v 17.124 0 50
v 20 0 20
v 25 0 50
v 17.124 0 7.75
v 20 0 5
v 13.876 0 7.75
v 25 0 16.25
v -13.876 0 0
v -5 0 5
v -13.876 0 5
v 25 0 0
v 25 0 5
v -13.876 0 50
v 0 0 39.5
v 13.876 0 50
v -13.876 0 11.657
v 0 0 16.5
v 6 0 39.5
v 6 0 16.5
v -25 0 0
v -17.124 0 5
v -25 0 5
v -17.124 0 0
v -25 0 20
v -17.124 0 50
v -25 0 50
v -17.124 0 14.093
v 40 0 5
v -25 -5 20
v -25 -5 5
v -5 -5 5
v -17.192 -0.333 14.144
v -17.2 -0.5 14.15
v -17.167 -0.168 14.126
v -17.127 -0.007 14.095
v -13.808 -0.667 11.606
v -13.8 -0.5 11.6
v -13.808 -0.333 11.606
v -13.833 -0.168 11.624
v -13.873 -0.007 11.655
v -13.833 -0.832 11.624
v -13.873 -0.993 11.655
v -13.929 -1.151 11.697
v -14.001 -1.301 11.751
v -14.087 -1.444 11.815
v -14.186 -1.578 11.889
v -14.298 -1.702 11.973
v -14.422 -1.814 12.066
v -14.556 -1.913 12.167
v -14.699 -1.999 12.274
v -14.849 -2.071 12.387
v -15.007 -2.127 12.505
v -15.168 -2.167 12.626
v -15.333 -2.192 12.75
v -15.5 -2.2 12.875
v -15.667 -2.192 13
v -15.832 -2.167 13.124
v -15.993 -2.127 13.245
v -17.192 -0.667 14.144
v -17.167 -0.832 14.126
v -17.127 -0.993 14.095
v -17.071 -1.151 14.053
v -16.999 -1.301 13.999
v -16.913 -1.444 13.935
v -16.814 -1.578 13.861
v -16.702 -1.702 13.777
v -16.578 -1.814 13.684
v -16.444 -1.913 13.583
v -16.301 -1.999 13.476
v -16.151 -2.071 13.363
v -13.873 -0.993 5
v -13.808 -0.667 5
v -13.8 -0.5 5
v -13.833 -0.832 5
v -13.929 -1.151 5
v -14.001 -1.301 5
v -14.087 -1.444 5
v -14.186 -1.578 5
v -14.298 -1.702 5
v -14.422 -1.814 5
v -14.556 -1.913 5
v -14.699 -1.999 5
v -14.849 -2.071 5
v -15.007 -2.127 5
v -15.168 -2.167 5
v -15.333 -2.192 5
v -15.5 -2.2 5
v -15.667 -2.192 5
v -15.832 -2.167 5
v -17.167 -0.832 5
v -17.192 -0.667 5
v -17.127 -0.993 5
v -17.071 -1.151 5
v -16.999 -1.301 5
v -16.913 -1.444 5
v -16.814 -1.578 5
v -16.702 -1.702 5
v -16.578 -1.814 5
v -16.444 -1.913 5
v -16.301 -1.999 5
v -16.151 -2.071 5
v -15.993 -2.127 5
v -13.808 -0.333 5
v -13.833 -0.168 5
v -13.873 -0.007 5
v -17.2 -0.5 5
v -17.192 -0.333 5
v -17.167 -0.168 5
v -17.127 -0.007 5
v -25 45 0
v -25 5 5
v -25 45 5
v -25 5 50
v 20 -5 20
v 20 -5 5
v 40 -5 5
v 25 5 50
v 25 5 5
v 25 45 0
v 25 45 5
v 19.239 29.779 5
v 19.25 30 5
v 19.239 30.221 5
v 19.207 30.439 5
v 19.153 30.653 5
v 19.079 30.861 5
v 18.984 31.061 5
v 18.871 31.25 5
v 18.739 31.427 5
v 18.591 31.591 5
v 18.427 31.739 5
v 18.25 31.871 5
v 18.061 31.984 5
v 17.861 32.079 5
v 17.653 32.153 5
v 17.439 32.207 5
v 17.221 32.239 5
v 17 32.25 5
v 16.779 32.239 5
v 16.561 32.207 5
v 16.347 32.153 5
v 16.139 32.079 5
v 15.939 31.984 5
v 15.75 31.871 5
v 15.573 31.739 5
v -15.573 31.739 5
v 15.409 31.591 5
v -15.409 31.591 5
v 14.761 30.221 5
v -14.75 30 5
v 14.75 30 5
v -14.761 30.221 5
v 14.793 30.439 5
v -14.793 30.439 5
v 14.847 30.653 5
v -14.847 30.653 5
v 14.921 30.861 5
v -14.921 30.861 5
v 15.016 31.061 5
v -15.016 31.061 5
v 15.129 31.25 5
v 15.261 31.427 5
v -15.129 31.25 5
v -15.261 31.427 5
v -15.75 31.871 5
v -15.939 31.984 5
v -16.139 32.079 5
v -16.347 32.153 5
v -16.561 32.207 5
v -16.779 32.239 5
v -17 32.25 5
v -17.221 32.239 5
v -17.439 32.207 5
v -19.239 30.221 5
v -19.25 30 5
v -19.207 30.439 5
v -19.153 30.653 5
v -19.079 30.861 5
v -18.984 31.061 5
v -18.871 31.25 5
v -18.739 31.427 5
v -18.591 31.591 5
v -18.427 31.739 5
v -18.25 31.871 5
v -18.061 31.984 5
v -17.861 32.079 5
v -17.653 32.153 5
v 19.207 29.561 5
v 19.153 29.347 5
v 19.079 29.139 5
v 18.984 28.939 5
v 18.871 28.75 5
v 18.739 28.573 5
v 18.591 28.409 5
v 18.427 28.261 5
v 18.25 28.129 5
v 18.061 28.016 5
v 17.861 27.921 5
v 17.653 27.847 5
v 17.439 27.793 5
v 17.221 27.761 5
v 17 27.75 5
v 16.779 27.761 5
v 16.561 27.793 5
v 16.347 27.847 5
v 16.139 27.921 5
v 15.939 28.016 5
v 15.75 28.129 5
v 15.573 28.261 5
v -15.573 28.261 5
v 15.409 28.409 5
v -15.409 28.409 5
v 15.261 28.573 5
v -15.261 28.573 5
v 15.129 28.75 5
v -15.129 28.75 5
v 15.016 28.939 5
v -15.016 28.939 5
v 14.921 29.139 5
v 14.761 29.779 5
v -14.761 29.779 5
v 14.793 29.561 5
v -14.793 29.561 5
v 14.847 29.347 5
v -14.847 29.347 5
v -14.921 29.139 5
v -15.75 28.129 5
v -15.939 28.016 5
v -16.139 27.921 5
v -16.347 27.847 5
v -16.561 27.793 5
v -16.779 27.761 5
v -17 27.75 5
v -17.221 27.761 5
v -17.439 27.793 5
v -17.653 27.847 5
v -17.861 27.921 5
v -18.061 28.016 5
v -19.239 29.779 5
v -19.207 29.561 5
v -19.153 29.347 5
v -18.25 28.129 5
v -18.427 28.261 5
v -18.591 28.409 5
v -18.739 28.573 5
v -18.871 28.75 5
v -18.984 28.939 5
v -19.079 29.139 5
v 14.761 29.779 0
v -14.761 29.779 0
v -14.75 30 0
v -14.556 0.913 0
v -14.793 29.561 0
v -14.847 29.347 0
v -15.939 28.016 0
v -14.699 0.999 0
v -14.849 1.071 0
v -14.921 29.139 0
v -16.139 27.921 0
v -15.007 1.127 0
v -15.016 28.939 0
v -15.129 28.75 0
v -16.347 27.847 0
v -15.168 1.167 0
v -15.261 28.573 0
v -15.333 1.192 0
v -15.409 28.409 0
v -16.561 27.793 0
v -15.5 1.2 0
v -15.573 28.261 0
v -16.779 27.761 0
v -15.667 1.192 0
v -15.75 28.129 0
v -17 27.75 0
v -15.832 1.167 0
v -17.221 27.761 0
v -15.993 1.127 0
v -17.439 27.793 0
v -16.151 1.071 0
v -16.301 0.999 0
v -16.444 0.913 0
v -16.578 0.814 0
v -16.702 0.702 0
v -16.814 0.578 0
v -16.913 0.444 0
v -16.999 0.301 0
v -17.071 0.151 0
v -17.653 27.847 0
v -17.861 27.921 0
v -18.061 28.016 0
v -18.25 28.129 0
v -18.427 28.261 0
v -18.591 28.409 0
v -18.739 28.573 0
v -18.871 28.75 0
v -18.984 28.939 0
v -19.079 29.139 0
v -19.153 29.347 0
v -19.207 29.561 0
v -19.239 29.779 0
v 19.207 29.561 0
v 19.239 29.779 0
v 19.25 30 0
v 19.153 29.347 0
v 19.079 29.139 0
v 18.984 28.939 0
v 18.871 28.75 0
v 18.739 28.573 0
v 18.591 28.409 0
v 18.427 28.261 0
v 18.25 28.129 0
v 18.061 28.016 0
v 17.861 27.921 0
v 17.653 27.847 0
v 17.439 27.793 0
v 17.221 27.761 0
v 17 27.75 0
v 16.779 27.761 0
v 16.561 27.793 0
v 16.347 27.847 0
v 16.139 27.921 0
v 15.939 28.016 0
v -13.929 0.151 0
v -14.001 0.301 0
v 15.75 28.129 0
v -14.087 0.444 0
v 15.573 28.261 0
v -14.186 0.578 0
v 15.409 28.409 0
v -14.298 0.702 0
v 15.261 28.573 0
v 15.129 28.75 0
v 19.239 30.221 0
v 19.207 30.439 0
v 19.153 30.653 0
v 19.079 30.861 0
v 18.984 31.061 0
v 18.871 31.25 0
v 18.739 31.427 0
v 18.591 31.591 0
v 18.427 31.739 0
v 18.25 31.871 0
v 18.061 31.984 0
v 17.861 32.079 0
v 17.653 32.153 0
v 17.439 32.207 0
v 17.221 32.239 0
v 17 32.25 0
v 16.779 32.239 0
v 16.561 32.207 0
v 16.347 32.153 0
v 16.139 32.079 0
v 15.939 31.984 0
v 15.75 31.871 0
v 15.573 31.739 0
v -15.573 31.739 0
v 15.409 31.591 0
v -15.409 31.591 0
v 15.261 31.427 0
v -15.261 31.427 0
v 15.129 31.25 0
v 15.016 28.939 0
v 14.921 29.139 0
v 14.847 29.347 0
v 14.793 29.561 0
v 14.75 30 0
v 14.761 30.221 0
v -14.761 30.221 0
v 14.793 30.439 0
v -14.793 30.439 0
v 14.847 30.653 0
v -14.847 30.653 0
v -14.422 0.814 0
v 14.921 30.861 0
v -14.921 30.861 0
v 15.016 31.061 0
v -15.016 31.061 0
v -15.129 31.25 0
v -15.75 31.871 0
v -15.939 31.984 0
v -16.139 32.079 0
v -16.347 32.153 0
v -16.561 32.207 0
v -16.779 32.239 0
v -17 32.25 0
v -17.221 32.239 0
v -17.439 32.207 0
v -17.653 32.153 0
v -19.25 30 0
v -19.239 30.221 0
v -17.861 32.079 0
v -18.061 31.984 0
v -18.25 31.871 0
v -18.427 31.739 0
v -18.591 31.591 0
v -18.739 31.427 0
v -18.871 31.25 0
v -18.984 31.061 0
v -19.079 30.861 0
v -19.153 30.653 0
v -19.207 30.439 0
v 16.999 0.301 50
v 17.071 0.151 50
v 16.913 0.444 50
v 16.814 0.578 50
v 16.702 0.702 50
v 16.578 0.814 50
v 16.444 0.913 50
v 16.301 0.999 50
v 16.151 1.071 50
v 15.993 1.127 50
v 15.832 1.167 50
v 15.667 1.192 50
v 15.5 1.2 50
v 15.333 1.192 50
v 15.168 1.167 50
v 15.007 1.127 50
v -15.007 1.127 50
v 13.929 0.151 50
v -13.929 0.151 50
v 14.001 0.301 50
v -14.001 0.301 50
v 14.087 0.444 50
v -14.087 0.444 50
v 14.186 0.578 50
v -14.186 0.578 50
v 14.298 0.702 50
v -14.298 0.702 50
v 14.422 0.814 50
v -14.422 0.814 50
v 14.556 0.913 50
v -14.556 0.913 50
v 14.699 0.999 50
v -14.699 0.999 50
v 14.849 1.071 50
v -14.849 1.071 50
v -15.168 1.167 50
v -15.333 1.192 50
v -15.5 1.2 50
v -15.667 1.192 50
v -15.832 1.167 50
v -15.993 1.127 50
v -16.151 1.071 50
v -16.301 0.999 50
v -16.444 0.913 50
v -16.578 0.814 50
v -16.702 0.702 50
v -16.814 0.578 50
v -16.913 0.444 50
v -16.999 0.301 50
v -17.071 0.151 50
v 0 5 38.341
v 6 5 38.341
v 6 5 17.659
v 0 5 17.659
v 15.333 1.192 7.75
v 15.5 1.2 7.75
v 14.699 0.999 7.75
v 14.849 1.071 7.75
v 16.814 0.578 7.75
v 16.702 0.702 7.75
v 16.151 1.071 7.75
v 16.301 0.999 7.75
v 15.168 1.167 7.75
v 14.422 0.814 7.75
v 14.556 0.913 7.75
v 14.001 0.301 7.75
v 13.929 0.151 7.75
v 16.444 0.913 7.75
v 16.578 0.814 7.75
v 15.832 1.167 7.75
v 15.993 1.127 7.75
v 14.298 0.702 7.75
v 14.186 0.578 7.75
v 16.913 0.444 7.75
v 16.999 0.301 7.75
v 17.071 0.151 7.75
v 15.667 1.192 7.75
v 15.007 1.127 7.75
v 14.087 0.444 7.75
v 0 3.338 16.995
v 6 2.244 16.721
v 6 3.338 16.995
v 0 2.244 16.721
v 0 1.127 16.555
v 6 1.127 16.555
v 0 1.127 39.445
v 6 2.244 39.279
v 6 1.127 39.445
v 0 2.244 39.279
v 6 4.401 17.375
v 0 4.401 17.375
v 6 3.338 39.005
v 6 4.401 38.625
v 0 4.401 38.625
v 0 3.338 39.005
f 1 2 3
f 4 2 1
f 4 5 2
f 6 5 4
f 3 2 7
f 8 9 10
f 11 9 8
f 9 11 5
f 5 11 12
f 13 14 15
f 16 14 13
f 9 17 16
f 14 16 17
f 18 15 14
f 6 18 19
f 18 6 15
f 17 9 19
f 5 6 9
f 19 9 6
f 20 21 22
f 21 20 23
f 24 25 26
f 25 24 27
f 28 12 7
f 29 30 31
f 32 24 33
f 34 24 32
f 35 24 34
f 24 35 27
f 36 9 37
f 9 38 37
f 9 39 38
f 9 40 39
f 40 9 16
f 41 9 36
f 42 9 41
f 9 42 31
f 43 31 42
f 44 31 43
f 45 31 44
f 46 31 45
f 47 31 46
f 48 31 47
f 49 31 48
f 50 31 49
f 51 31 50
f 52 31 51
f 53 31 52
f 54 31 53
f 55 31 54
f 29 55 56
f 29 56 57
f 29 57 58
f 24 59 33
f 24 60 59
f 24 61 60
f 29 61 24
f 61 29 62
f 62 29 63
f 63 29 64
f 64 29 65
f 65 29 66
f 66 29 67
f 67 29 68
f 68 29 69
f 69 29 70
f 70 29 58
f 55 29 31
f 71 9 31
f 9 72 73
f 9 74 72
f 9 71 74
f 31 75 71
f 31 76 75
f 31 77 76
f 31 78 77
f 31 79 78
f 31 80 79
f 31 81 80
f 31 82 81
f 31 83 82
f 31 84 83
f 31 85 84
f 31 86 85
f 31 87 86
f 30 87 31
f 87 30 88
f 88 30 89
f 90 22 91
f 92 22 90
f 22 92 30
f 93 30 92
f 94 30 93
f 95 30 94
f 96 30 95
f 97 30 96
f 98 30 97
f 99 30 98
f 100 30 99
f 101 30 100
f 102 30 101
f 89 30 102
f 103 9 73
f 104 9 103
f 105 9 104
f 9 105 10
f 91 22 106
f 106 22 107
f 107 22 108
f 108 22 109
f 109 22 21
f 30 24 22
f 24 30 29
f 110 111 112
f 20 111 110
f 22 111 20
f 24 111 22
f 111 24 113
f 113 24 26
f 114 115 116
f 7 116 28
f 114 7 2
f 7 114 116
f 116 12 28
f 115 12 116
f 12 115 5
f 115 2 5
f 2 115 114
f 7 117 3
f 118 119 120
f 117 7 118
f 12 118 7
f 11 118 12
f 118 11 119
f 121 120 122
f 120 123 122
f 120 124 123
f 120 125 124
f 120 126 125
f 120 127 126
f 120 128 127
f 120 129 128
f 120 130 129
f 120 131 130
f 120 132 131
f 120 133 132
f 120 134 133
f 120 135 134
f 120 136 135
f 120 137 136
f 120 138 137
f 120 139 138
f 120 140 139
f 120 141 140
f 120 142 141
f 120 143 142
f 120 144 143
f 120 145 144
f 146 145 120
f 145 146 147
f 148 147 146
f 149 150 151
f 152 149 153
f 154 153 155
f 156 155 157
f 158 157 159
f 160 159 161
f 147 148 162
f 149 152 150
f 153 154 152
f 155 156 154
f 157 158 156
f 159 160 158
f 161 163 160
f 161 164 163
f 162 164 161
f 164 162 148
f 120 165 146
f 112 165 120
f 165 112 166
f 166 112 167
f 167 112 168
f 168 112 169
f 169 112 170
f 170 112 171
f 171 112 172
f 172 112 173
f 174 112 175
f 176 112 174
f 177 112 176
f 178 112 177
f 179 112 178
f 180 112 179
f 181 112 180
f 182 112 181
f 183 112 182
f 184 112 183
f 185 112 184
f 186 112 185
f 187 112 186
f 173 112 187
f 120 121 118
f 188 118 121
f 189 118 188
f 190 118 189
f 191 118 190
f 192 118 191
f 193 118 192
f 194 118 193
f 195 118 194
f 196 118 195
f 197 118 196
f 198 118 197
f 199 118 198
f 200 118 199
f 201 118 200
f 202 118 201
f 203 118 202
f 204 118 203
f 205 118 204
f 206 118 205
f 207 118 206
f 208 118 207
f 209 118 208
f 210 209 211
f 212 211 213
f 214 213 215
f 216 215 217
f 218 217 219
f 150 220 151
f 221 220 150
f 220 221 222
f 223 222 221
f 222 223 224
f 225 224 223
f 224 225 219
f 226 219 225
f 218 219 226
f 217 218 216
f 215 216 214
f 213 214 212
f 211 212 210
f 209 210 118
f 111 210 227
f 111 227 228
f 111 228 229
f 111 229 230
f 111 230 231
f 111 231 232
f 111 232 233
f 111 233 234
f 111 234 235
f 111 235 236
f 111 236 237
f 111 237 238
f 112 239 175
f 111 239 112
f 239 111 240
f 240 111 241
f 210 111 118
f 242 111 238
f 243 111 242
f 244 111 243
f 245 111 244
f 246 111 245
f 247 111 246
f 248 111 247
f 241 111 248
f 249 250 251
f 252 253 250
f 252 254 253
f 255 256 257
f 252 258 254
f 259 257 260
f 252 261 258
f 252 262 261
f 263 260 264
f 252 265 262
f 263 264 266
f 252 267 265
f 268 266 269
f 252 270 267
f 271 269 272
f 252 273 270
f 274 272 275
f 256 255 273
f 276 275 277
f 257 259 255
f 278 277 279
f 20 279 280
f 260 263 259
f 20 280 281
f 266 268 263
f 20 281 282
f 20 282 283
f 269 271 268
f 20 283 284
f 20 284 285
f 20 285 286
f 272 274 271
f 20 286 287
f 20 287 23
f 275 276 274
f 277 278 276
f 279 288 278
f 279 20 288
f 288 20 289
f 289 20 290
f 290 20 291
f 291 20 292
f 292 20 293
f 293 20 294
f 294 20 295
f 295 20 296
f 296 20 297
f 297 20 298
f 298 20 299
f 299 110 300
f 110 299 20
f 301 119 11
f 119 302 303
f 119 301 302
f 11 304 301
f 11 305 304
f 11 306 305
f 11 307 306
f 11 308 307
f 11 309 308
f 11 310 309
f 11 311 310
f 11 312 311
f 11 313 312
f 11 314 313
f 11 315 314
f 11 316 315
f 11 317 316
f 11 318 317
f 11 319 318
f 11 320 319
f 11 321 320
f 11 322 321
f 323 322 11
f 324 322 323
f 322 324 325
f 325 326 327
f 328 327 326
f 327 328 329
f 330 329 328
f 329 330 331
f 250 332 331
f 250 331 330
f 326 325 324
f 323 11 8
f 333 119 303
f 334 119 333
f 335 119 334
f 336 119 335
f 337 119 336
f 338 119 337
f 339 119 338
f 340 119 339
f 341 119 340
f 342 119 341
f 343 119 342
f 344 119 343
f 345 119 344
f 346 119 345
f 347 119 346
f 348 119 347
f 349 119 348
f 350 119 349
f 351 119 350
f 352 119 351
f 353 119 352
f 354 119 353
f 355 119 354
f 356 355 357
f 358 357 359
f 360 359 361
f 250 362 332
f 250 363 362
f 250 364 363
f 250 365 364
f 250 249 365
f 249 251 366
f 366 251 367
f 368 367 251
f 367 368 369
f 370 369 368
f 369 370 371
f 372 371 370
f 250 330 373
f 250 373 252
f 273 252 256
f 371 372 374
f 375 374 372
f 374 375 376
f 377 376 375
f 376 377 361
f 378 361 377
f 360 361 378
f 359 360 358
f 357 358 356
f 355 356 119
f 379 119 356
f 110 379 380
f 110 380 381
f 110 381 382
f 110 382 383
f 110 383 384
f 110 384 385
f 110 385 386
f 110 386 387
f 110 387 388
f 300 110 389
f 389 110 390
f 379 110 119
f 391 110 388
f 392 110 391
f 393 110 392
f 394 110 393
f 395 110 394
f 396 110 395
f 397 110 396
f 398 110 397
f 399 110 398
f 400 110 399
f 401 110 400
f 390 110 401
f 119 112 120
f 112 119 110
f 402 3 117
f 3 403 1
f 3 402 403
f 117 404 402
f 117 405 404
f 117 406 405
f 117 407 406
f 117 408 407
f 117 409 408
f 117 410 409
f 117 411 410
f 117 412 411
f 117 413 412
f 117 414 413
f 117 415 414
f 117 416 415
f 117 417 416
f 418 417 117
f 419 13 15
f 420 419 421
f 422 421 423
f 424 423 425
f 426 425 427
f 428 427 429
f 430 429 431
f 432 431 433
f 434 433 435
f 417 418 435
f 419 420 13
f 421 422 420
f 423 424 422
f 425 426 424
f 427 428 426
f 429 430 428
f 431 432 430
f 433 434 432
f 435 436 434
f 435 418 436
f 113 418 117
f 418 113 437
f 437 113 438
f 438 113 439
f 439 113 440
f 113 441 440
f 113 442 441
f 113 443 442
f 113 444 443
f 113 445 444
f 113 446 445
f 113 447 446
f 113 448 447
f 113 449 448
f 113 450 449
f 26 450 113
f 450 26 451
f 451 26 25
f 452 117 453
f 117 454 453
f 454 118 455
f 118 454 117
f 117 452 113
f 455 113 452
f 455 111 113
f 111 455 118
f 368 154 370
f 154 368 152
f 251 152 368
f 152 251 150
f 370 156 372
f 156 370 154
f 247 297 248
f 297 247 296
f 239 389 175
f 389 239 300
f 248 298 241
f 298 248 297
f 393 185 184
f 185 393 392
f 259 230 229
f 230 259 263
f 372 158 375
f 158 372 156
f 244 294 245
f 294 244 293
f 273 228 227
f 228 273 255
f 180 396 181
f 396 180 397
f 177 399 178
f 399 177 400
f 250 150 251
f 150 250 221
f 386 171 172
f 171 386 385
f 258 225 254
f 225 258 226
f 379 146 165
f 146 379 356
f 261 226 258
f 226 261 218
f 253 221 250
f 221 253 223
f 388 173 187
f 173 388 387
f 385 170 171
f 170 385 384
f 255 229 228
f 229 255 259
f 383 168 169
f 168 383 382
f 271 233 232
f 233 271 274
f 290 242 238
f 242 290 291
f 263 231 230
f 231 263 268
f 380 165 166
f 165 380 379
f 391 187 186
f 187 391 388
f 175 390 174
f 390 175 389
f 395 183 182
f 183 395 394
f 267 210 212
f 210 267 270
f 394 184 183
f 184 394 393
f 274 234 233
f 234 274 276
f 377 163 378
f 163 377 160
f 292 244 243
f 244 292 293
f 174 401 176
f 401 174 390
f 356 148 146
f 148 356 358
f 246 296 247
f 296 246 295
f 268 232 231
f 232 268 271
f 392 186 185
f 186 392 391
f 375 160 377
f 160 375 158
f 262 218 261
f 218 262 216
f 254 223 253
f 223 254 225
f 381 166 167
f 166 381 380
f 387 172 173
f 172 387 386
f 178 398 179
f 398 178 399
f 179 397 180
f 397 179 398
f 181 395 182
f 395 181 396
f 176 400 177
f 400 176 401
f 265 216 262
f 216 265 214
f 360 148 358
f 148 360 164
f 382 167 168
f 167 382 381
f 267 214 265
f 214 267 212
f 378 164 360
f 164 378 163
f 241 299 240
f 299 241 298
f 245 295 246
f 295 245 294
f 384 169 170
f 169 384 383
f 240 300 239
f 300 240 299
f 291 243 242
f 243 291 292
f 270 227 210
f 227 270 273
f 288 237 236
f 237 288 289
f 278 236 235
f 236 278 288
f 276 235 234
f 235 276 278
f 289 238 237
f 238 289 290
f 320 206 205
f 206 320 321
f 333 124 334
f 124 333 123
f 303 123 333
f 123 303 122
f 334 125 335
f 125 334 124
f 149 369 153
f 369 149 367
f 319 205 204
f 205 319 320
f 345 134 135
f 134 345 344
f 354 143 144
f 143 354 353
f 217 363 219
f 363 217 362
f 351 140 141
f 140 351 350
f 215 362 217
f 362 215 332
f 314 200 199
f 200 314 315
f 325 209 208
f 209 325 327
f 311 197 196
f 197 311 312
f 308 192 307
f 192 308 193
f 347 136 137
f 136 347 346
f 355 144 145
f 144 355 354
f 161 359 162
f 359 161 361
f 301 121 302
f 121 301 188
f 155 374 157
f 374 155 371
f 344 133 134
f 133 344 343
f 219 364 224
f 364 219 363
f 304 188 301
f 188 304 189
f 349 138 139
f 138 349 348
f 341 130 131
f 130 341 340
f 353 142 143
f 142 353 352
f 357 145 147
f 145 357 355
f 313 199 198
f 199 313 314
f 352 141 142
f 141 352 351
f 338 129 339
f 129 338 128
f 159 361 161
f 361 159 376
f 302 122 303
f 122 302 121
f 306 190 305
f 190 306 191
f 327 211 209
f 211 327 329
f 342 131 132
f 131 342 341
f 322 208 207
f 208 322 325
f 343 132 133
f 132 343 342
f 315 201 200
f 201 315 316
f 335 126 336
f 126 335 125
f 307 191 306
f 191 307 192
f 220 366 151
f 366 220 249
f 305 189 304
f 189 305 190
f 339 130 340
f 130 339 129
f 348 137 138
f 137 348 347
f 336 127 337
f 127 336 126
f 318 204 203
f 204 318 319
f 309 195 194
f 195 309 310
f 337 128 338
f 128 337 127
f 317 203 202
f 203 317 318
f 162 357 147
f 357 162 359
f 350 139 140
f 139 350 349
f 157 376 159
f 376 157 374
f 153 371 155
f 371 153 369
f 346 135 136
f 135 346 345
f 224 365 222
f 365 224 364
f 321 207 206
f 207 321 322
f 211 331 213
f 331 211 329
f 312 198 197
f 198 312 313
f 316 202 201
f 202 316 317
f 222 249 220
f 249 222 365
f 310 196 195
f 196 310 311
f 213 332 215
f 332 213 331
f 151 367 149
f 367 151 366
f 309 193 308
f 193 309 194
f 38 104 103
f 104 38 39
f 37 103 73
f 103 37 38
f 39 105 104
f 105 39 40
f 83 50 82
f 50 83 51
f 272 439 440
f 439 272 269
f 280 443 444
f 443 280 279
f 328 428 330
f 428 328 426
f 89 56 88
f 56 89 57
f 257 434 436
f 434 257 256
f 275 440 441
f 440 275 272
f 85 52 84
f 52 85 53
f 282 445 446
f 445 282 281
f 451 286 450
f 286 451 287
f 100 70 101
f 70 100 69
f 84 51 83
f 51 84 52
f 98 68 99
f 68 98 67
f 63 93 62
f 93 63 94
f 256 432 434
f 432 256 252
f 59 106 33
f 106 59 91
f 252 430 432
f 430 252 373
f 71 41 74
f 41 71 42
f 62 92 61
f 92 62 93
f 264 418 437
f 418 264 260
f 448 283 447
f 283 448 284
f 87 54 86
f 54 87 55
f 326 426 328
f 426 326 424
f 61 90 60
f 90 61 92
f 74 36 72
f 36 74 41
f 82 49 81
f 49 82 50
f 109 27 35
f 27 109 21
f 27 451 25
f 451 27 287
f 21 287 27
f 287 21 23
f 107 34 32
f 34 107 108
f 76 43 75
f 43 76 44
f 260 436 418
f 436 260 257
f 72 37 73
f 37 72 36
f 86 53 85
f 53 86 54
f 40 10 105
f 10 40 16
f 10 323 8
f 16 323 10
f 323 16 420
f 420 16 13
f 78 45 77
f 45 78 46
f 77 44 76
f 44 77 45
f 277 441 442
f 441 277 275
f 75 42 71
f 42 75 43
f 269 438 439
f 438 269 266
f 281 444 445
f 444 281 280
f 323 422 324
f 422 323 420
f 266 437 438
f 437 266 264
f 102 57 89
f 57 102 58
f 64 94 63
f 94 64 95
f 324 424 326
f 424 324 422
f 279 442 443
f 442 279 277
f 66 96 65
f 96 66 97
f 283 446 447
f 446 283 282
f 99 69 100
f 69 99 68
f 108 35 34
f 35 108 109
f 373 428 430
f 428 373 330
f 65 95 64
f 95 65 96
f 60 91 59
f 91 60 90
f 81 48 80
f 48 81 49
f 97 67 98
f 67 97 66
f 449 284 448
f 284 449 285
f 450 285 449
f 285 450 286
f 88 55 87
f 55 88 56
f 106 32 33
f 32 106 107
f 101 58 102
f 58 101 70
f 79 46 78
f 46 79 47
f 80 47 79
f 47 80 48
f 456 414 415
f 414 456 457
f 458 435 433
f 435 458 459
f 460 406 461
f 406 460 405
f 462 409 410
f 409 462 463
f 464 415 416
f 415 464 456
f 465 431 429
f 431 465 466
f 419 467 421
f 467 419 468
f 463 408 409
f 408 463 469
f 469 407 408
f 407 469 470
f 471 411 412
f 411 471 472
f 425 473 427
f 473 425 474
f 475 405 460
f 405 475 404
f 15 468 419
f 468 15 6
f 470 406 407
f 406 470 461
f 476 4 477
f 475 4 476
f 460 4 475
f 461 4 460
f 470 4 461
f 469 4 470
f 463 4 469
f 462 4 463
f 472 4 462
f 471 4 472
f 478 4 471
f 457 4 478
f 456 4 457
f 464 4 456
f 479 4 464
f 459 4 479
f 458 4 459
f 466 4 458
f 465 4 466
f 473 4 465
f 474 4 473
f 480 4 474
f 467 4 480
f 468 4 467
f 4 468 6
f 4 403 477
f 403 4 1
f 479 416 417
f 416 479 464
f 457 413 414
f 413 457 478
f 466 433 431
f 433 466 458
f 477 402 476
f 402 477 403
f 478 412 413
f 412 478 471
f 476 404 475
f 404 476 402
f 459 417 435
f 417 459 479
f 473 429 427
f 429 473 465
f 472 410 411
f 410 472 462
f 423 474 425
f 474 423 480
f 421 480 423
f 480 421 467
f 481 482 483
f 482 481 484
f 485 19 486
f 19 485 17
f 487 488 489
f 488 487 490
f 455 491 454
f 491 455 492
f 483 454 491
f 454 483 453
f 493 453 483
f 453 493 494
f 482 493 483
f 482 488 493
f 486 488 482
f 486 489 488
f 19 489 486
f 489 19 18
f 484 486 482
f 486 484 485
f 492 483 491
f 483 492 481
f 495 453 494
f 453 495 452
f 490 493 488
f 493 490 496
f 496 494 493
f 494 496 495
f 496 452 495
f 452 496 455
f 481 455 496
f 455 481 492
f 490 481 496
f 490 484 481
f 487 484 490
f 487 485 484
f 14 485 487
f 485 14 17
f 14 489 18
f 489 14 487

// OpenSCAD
// L-shaped mounting bracket for NEMA 17 stepper motor (e.g. syringe pump)
// Print orientation: base plate on bed (z = 0), motor plate builds upward.

$fn = 64;

// ---- Base plate ----
base_x0 = -25;      // base plate x start
base_x1 = 25;       // base plate x end
base_y0 = 0;        // base plate y start
base_y1 = 45;       // base plate y end
base_z0 = 0;        // base plate z start
base_z1 = 5;        // base plate z end
hole_d4 = 4.5;      // M4 through-hole diameter
hole_x4 = [-17, 17];// M4 hole x positions
hole_y4 = 30;       // M4 hole y position

// ---- Motor plate ----
motor_x0 = -25;     // motor plate x start
motor_x1 = 25;      // motor plate x end
motor_y0 = 0;       // motor plate y start
motor_y1 = 5;       // motor plate y end
motor_z0 = 0;       // motor plate z start
motor_z1 = 50;      // motor plate z end
boss_d  = 23;       // motor centring boss hole diameter
boss_x  = 0;        // boss hole x centre
boss_z  = 28;       // boss hole z centre
screw_d = 3.4;      // M3 screw hole diameter
screw_n = 4;        // number of screw holes
screw_a = 31;       // square pattern side length

// ---- Gussets ----
gusset_t = 5;       // gusset thickness (X)
gusset_y = 20;      // leg length along +Y
gusset_z = 20;      // leg length along +Z

// ---- Misc ----
eps = 0.5;          // cutter overshoot

difference() {
    union() {
        // Base plate
        translate([base_x0, base_y0, base_z0])
            cube([base_x1 - base_x0, base_y1 - base_y0, base_z1 - base_z0]);

        // Motor plate
        translate([motor_x0, motor_y0, motor_z0])
            cube([motor_x1 - motor_x0, motor_y1 - motor_y0, motor_z1 - motor_z0]);

        // Gussets (right triangle in YZ, flush with left/right edges)
        for (sx = [-1, 1])
            translate([sx > 0 ? 20 : -25, 0, 0])
                rotate([90, 0, 0])
                    linear_extrude(height = gusset_t)
                        polygon([[0, 5], [gusset_y, 5], [0, gusset_z]]);
    }

    // Base plate through-holes
    for (x = hole_x4)
        translate([x, hole_y4, -eps])
            cylinder(d = hole_d4, h = base_z1 - base_z0 + 2 * eps);

    // Boss hole (along Y)
    translate([boss_x, 0, boss_z])
        rotate([0, 90, 0])
            cylinder(d = boss_d, h = motor_y1 - motor_y0 + 2 * eps);

    // Screw holes on square pattern
    for (i = [0 : screw_n - 1]) {
        let (x = (i % 2 - 0.5) * screw_a,
              z = (i / 2 - 0.25) * screw_a)
            translate([x, motor_y0 - eps, z])
                cylinder(d = screw_d, h = motor_z1 - motor_z0 + 2 * eps);
    }
}
